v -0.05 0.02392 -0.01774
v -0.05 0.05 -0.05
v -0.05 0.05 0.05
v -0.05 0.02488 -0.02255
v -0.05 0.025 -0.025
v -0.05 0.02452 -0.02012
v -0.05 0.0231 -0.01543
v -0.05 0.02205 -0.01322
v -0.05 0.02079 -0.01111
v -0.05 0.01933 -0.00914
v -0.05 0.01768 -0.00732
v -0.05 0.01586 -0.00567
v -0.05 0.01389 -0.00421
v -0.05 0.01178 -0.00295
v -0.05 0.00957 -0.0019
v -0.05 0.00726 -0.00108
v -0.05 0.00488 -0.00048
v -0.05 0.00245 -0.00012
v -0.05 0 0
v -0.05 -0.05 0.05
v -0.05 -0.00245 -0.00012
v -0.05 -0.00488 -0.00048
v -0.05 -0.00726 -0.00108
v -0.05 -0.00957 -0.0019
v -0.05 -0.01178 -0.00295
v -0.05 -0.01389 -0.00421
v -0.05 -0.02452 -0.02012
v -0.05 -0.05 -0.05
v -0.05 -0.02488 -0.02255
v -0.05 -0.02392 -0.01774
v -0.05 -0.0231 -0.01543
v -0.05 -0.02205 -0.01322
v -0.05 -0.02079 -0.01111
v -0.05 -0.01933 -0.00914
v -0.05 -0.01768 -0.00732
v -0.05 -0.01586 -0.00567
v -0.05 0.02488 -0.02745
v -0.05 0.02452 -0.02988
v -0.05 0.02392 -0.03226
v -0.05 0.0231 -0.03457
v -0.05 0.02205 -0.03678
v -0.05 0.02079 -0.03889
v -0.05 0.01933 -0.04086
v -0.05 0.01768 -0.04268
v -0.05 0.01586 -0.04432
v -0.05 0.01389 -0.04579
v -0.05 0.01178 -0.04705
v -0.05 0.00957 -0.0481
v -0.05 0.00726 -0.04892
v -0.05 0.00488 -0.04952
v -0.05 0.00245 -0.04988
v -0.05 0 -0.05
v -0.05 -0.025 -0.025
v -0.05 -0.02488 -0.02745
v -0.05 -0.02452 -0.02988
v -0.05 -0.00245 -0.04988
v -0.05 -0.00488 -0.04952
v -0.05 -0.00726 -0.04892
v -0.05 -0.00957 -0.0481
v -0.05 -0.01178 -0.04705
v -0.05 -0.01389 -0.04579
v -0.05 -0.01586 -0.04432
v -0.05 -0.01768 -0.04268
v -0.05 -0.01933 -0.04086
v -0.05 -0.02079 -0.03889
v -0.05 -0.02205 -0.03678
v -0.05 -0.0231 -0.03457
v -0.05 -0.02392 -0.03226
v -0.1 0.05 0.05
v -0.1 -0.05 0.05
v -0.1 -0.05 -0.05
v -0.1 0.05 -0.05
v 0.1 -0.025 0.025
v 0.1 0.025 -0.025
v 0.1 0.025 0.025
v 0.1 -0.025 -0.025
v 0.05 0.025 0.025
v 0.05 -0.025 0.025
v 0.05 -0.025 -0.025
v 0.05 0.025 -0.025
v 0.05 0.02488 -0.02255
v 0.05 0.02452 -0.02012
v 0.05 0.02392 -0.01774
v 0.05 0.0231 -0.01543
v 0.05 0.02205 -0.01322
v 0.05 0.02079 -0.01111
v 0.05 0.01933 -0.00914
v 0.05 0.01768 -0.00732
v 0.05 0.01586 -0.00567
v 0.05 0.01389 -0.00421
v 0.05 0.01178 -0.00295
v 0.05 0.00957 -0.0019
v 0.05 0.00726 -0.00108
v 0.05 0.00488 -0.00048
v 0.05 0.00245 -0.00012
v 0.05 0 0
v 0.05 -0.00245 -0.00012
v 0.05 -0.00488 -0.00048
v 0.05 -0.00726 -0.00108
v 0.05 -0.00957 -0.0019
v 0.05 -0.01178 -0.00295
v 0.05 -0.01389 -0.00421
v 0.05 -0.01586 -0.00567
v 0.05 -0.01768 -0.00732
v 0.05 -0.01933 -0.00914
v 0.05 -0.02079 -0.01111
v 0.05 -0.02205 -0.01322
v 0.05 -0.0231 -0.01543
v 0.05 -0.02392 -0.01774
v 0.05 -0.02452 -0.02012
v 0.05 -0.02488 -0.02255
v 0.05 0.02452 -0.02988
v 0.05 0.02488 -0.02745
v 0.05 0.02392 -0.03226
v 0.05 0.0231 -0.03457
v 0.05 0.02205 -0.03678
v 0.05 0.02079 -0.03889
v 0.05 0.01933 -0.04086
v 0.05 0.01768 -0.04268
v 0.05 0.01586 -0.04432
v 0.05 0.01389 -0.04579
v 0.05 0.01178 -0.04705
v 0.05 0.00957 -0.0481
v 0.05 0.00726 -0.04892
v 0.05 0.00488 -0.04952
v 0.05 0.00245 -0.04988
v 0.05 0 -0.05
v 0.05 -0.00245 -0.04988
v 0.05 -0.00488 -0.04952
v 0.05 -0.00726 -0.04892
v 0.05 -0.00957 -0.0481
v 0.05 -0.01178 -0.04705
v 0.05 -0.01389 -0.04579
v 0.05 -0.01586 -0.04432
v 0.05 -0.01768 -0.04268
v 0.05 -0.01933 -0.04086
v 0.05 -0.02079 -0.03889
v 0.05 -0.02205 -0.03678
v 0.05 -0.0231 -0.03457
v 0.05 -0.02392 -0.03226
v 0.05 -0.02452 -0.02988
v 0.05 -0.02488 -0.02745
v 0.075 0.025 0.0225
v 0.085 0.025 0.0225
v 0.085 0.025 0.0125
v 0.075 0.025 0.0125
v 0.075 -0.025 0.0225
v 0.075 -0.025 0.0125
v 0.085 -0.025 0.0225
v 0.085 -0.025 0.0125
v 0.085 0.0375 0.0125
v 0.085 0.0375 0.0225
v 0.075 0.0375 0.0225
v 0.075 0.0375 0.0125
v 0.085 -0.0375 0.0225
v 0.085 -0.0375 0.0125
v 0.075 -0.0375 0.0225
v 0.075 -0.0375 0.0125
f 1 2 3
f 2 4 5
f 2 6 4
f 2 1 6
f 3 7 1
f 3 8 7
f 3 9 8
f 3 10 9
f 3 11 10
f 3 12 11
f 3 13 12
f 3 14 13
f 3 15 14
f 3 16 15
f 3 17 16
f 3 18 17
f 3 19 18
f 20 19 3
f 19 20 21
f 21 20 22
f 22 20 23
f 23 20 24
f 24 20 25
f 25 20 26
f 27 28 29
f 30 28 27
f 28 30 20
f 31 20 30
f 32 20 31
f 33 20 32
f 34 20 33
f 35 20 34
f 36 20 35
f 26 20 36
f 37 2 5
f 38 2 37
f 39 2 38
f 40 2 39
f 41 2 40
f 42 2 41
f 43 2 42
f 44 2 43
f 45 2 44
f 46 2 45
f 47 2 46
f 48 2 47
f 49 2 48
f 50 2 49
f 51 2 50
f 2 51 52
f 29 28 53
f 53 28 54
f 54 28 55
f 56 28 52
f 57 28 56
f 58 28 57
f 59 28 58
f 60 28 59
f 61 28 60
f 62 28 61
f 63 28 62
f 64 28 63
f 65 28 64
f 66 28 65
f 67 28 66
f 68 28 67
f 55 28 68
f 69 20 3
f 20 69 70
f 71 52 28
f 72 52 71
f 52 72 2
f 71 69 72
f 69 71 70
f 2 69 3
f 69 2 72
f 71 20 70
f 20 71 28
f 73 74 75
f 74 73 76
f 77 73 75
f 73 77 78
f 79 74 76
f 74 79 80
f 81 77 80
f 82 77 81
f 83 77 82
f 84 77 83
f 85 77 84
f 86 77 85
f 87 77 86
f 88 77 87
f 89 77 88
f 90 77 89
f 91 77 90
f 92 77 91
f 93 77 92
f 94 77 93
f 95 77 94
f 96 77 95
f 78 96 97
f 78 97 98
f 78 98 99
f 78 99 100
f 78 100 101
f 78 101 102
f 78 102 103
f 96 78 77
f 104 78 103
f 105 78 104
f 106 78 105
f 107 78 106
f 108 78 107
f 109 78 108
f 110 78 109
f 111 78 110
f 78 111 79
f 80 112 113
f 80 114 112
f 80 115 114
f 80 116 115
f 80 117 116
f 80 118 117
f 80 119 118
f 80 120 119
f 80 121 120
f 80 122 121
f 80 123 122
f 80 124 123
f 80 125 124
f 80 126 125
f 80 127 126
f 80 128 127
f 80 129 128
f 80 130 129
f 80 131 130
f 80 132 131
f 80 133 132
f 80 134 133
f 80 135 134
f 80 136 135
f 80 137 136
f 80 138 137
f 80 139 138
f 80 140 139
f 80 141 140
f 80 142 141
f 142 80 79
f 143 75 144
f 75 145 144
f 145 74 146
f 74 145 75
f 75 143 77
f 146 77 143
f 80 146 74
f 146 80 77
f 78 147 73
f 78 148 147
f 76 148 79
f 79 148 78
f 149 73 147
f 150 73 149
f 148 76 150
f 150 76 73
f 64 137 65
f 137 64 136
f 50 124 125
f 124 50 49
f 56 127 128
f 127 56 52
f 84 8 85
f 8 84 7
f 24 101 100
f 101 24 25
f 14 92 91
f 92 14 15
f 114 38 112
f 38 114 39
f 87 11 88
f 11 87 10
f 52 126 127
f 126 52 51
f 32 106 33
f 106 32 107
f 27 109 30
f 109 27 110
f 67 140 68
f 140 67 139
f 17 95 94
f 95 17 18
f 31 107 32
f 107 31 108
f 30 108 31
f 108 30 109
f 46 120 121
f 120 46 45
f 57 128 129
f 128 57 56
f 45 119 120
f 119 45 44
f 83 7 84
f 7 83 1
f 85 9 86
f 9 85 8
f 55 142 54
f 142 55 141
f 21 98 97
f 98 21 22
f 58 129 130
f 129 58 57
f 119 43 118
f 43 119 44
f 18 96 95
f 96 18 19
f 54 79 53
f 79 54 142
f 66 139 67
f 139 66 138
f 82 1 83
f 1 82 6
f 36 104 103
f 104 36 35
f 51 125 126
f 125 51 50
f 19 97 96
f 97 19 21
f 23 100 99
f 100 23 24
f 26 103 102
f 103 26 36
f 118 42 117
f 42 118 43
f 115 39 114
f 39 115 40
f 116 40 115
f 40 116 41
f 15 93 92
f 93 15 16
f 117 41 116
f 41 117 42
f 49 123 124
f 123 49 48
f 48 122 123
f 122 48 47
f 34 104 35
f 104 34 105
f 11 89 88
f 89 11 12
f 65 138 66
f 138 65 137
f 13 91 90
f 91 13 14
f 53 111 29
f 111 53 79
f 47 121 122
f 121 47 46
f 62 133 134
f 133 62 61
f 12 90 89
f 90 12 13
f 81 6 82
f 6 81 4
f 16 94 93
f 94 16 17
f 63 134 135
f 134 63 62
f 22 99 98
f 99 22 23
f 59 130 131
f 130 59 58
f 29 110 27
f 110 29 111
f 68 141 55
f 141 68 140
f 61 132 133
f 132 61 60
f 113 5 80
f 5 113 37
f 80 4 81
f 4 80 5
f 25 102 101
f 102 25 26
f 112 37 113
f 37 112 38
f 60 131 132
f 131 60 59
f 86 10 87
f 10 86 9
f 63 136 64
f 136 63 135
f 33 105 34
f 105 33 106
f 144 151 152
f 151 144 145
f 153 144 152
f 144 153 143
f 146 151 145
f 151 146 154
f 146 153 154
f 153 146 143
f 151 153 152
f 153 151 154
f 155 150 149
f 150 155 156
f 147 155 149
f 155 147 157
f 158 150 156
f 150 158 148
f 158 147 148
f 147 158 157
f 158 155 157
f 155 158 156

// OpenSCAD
$fn=64;

module elbow_bracket() {
    // Larger rectangular block
    translate([-0.1, -0.05, -0.05])
    cube([0.05, 0.1, 0.1]);

    // Smaller rectangular tongue
    translate([0.05, -0.025, -0.025])
    cube([0.05, 0.05, 0.05]);

    // Curved body
    translate([0, 0, -0.025])
    rotate([0, 90, 0])
    cylinder(r=0.025, h=0.1, center=true);

    // Rounded/obround end-cap feature
    translate([0.075, 0, 0])
    rotate([0, 90, 0])
    cylinder(r=0.0125, h=0.05, center=true);

    // Two small rectangular lugs/steps
    translate([0.075, 0.0125, 0.0125])
    cube([0.01, 0.025, 0.01]);

    translate([0.075, -0.0375, 0.0125])
    cube([0.01, 0.025, 0.01]);
}

elbow_bracket();
